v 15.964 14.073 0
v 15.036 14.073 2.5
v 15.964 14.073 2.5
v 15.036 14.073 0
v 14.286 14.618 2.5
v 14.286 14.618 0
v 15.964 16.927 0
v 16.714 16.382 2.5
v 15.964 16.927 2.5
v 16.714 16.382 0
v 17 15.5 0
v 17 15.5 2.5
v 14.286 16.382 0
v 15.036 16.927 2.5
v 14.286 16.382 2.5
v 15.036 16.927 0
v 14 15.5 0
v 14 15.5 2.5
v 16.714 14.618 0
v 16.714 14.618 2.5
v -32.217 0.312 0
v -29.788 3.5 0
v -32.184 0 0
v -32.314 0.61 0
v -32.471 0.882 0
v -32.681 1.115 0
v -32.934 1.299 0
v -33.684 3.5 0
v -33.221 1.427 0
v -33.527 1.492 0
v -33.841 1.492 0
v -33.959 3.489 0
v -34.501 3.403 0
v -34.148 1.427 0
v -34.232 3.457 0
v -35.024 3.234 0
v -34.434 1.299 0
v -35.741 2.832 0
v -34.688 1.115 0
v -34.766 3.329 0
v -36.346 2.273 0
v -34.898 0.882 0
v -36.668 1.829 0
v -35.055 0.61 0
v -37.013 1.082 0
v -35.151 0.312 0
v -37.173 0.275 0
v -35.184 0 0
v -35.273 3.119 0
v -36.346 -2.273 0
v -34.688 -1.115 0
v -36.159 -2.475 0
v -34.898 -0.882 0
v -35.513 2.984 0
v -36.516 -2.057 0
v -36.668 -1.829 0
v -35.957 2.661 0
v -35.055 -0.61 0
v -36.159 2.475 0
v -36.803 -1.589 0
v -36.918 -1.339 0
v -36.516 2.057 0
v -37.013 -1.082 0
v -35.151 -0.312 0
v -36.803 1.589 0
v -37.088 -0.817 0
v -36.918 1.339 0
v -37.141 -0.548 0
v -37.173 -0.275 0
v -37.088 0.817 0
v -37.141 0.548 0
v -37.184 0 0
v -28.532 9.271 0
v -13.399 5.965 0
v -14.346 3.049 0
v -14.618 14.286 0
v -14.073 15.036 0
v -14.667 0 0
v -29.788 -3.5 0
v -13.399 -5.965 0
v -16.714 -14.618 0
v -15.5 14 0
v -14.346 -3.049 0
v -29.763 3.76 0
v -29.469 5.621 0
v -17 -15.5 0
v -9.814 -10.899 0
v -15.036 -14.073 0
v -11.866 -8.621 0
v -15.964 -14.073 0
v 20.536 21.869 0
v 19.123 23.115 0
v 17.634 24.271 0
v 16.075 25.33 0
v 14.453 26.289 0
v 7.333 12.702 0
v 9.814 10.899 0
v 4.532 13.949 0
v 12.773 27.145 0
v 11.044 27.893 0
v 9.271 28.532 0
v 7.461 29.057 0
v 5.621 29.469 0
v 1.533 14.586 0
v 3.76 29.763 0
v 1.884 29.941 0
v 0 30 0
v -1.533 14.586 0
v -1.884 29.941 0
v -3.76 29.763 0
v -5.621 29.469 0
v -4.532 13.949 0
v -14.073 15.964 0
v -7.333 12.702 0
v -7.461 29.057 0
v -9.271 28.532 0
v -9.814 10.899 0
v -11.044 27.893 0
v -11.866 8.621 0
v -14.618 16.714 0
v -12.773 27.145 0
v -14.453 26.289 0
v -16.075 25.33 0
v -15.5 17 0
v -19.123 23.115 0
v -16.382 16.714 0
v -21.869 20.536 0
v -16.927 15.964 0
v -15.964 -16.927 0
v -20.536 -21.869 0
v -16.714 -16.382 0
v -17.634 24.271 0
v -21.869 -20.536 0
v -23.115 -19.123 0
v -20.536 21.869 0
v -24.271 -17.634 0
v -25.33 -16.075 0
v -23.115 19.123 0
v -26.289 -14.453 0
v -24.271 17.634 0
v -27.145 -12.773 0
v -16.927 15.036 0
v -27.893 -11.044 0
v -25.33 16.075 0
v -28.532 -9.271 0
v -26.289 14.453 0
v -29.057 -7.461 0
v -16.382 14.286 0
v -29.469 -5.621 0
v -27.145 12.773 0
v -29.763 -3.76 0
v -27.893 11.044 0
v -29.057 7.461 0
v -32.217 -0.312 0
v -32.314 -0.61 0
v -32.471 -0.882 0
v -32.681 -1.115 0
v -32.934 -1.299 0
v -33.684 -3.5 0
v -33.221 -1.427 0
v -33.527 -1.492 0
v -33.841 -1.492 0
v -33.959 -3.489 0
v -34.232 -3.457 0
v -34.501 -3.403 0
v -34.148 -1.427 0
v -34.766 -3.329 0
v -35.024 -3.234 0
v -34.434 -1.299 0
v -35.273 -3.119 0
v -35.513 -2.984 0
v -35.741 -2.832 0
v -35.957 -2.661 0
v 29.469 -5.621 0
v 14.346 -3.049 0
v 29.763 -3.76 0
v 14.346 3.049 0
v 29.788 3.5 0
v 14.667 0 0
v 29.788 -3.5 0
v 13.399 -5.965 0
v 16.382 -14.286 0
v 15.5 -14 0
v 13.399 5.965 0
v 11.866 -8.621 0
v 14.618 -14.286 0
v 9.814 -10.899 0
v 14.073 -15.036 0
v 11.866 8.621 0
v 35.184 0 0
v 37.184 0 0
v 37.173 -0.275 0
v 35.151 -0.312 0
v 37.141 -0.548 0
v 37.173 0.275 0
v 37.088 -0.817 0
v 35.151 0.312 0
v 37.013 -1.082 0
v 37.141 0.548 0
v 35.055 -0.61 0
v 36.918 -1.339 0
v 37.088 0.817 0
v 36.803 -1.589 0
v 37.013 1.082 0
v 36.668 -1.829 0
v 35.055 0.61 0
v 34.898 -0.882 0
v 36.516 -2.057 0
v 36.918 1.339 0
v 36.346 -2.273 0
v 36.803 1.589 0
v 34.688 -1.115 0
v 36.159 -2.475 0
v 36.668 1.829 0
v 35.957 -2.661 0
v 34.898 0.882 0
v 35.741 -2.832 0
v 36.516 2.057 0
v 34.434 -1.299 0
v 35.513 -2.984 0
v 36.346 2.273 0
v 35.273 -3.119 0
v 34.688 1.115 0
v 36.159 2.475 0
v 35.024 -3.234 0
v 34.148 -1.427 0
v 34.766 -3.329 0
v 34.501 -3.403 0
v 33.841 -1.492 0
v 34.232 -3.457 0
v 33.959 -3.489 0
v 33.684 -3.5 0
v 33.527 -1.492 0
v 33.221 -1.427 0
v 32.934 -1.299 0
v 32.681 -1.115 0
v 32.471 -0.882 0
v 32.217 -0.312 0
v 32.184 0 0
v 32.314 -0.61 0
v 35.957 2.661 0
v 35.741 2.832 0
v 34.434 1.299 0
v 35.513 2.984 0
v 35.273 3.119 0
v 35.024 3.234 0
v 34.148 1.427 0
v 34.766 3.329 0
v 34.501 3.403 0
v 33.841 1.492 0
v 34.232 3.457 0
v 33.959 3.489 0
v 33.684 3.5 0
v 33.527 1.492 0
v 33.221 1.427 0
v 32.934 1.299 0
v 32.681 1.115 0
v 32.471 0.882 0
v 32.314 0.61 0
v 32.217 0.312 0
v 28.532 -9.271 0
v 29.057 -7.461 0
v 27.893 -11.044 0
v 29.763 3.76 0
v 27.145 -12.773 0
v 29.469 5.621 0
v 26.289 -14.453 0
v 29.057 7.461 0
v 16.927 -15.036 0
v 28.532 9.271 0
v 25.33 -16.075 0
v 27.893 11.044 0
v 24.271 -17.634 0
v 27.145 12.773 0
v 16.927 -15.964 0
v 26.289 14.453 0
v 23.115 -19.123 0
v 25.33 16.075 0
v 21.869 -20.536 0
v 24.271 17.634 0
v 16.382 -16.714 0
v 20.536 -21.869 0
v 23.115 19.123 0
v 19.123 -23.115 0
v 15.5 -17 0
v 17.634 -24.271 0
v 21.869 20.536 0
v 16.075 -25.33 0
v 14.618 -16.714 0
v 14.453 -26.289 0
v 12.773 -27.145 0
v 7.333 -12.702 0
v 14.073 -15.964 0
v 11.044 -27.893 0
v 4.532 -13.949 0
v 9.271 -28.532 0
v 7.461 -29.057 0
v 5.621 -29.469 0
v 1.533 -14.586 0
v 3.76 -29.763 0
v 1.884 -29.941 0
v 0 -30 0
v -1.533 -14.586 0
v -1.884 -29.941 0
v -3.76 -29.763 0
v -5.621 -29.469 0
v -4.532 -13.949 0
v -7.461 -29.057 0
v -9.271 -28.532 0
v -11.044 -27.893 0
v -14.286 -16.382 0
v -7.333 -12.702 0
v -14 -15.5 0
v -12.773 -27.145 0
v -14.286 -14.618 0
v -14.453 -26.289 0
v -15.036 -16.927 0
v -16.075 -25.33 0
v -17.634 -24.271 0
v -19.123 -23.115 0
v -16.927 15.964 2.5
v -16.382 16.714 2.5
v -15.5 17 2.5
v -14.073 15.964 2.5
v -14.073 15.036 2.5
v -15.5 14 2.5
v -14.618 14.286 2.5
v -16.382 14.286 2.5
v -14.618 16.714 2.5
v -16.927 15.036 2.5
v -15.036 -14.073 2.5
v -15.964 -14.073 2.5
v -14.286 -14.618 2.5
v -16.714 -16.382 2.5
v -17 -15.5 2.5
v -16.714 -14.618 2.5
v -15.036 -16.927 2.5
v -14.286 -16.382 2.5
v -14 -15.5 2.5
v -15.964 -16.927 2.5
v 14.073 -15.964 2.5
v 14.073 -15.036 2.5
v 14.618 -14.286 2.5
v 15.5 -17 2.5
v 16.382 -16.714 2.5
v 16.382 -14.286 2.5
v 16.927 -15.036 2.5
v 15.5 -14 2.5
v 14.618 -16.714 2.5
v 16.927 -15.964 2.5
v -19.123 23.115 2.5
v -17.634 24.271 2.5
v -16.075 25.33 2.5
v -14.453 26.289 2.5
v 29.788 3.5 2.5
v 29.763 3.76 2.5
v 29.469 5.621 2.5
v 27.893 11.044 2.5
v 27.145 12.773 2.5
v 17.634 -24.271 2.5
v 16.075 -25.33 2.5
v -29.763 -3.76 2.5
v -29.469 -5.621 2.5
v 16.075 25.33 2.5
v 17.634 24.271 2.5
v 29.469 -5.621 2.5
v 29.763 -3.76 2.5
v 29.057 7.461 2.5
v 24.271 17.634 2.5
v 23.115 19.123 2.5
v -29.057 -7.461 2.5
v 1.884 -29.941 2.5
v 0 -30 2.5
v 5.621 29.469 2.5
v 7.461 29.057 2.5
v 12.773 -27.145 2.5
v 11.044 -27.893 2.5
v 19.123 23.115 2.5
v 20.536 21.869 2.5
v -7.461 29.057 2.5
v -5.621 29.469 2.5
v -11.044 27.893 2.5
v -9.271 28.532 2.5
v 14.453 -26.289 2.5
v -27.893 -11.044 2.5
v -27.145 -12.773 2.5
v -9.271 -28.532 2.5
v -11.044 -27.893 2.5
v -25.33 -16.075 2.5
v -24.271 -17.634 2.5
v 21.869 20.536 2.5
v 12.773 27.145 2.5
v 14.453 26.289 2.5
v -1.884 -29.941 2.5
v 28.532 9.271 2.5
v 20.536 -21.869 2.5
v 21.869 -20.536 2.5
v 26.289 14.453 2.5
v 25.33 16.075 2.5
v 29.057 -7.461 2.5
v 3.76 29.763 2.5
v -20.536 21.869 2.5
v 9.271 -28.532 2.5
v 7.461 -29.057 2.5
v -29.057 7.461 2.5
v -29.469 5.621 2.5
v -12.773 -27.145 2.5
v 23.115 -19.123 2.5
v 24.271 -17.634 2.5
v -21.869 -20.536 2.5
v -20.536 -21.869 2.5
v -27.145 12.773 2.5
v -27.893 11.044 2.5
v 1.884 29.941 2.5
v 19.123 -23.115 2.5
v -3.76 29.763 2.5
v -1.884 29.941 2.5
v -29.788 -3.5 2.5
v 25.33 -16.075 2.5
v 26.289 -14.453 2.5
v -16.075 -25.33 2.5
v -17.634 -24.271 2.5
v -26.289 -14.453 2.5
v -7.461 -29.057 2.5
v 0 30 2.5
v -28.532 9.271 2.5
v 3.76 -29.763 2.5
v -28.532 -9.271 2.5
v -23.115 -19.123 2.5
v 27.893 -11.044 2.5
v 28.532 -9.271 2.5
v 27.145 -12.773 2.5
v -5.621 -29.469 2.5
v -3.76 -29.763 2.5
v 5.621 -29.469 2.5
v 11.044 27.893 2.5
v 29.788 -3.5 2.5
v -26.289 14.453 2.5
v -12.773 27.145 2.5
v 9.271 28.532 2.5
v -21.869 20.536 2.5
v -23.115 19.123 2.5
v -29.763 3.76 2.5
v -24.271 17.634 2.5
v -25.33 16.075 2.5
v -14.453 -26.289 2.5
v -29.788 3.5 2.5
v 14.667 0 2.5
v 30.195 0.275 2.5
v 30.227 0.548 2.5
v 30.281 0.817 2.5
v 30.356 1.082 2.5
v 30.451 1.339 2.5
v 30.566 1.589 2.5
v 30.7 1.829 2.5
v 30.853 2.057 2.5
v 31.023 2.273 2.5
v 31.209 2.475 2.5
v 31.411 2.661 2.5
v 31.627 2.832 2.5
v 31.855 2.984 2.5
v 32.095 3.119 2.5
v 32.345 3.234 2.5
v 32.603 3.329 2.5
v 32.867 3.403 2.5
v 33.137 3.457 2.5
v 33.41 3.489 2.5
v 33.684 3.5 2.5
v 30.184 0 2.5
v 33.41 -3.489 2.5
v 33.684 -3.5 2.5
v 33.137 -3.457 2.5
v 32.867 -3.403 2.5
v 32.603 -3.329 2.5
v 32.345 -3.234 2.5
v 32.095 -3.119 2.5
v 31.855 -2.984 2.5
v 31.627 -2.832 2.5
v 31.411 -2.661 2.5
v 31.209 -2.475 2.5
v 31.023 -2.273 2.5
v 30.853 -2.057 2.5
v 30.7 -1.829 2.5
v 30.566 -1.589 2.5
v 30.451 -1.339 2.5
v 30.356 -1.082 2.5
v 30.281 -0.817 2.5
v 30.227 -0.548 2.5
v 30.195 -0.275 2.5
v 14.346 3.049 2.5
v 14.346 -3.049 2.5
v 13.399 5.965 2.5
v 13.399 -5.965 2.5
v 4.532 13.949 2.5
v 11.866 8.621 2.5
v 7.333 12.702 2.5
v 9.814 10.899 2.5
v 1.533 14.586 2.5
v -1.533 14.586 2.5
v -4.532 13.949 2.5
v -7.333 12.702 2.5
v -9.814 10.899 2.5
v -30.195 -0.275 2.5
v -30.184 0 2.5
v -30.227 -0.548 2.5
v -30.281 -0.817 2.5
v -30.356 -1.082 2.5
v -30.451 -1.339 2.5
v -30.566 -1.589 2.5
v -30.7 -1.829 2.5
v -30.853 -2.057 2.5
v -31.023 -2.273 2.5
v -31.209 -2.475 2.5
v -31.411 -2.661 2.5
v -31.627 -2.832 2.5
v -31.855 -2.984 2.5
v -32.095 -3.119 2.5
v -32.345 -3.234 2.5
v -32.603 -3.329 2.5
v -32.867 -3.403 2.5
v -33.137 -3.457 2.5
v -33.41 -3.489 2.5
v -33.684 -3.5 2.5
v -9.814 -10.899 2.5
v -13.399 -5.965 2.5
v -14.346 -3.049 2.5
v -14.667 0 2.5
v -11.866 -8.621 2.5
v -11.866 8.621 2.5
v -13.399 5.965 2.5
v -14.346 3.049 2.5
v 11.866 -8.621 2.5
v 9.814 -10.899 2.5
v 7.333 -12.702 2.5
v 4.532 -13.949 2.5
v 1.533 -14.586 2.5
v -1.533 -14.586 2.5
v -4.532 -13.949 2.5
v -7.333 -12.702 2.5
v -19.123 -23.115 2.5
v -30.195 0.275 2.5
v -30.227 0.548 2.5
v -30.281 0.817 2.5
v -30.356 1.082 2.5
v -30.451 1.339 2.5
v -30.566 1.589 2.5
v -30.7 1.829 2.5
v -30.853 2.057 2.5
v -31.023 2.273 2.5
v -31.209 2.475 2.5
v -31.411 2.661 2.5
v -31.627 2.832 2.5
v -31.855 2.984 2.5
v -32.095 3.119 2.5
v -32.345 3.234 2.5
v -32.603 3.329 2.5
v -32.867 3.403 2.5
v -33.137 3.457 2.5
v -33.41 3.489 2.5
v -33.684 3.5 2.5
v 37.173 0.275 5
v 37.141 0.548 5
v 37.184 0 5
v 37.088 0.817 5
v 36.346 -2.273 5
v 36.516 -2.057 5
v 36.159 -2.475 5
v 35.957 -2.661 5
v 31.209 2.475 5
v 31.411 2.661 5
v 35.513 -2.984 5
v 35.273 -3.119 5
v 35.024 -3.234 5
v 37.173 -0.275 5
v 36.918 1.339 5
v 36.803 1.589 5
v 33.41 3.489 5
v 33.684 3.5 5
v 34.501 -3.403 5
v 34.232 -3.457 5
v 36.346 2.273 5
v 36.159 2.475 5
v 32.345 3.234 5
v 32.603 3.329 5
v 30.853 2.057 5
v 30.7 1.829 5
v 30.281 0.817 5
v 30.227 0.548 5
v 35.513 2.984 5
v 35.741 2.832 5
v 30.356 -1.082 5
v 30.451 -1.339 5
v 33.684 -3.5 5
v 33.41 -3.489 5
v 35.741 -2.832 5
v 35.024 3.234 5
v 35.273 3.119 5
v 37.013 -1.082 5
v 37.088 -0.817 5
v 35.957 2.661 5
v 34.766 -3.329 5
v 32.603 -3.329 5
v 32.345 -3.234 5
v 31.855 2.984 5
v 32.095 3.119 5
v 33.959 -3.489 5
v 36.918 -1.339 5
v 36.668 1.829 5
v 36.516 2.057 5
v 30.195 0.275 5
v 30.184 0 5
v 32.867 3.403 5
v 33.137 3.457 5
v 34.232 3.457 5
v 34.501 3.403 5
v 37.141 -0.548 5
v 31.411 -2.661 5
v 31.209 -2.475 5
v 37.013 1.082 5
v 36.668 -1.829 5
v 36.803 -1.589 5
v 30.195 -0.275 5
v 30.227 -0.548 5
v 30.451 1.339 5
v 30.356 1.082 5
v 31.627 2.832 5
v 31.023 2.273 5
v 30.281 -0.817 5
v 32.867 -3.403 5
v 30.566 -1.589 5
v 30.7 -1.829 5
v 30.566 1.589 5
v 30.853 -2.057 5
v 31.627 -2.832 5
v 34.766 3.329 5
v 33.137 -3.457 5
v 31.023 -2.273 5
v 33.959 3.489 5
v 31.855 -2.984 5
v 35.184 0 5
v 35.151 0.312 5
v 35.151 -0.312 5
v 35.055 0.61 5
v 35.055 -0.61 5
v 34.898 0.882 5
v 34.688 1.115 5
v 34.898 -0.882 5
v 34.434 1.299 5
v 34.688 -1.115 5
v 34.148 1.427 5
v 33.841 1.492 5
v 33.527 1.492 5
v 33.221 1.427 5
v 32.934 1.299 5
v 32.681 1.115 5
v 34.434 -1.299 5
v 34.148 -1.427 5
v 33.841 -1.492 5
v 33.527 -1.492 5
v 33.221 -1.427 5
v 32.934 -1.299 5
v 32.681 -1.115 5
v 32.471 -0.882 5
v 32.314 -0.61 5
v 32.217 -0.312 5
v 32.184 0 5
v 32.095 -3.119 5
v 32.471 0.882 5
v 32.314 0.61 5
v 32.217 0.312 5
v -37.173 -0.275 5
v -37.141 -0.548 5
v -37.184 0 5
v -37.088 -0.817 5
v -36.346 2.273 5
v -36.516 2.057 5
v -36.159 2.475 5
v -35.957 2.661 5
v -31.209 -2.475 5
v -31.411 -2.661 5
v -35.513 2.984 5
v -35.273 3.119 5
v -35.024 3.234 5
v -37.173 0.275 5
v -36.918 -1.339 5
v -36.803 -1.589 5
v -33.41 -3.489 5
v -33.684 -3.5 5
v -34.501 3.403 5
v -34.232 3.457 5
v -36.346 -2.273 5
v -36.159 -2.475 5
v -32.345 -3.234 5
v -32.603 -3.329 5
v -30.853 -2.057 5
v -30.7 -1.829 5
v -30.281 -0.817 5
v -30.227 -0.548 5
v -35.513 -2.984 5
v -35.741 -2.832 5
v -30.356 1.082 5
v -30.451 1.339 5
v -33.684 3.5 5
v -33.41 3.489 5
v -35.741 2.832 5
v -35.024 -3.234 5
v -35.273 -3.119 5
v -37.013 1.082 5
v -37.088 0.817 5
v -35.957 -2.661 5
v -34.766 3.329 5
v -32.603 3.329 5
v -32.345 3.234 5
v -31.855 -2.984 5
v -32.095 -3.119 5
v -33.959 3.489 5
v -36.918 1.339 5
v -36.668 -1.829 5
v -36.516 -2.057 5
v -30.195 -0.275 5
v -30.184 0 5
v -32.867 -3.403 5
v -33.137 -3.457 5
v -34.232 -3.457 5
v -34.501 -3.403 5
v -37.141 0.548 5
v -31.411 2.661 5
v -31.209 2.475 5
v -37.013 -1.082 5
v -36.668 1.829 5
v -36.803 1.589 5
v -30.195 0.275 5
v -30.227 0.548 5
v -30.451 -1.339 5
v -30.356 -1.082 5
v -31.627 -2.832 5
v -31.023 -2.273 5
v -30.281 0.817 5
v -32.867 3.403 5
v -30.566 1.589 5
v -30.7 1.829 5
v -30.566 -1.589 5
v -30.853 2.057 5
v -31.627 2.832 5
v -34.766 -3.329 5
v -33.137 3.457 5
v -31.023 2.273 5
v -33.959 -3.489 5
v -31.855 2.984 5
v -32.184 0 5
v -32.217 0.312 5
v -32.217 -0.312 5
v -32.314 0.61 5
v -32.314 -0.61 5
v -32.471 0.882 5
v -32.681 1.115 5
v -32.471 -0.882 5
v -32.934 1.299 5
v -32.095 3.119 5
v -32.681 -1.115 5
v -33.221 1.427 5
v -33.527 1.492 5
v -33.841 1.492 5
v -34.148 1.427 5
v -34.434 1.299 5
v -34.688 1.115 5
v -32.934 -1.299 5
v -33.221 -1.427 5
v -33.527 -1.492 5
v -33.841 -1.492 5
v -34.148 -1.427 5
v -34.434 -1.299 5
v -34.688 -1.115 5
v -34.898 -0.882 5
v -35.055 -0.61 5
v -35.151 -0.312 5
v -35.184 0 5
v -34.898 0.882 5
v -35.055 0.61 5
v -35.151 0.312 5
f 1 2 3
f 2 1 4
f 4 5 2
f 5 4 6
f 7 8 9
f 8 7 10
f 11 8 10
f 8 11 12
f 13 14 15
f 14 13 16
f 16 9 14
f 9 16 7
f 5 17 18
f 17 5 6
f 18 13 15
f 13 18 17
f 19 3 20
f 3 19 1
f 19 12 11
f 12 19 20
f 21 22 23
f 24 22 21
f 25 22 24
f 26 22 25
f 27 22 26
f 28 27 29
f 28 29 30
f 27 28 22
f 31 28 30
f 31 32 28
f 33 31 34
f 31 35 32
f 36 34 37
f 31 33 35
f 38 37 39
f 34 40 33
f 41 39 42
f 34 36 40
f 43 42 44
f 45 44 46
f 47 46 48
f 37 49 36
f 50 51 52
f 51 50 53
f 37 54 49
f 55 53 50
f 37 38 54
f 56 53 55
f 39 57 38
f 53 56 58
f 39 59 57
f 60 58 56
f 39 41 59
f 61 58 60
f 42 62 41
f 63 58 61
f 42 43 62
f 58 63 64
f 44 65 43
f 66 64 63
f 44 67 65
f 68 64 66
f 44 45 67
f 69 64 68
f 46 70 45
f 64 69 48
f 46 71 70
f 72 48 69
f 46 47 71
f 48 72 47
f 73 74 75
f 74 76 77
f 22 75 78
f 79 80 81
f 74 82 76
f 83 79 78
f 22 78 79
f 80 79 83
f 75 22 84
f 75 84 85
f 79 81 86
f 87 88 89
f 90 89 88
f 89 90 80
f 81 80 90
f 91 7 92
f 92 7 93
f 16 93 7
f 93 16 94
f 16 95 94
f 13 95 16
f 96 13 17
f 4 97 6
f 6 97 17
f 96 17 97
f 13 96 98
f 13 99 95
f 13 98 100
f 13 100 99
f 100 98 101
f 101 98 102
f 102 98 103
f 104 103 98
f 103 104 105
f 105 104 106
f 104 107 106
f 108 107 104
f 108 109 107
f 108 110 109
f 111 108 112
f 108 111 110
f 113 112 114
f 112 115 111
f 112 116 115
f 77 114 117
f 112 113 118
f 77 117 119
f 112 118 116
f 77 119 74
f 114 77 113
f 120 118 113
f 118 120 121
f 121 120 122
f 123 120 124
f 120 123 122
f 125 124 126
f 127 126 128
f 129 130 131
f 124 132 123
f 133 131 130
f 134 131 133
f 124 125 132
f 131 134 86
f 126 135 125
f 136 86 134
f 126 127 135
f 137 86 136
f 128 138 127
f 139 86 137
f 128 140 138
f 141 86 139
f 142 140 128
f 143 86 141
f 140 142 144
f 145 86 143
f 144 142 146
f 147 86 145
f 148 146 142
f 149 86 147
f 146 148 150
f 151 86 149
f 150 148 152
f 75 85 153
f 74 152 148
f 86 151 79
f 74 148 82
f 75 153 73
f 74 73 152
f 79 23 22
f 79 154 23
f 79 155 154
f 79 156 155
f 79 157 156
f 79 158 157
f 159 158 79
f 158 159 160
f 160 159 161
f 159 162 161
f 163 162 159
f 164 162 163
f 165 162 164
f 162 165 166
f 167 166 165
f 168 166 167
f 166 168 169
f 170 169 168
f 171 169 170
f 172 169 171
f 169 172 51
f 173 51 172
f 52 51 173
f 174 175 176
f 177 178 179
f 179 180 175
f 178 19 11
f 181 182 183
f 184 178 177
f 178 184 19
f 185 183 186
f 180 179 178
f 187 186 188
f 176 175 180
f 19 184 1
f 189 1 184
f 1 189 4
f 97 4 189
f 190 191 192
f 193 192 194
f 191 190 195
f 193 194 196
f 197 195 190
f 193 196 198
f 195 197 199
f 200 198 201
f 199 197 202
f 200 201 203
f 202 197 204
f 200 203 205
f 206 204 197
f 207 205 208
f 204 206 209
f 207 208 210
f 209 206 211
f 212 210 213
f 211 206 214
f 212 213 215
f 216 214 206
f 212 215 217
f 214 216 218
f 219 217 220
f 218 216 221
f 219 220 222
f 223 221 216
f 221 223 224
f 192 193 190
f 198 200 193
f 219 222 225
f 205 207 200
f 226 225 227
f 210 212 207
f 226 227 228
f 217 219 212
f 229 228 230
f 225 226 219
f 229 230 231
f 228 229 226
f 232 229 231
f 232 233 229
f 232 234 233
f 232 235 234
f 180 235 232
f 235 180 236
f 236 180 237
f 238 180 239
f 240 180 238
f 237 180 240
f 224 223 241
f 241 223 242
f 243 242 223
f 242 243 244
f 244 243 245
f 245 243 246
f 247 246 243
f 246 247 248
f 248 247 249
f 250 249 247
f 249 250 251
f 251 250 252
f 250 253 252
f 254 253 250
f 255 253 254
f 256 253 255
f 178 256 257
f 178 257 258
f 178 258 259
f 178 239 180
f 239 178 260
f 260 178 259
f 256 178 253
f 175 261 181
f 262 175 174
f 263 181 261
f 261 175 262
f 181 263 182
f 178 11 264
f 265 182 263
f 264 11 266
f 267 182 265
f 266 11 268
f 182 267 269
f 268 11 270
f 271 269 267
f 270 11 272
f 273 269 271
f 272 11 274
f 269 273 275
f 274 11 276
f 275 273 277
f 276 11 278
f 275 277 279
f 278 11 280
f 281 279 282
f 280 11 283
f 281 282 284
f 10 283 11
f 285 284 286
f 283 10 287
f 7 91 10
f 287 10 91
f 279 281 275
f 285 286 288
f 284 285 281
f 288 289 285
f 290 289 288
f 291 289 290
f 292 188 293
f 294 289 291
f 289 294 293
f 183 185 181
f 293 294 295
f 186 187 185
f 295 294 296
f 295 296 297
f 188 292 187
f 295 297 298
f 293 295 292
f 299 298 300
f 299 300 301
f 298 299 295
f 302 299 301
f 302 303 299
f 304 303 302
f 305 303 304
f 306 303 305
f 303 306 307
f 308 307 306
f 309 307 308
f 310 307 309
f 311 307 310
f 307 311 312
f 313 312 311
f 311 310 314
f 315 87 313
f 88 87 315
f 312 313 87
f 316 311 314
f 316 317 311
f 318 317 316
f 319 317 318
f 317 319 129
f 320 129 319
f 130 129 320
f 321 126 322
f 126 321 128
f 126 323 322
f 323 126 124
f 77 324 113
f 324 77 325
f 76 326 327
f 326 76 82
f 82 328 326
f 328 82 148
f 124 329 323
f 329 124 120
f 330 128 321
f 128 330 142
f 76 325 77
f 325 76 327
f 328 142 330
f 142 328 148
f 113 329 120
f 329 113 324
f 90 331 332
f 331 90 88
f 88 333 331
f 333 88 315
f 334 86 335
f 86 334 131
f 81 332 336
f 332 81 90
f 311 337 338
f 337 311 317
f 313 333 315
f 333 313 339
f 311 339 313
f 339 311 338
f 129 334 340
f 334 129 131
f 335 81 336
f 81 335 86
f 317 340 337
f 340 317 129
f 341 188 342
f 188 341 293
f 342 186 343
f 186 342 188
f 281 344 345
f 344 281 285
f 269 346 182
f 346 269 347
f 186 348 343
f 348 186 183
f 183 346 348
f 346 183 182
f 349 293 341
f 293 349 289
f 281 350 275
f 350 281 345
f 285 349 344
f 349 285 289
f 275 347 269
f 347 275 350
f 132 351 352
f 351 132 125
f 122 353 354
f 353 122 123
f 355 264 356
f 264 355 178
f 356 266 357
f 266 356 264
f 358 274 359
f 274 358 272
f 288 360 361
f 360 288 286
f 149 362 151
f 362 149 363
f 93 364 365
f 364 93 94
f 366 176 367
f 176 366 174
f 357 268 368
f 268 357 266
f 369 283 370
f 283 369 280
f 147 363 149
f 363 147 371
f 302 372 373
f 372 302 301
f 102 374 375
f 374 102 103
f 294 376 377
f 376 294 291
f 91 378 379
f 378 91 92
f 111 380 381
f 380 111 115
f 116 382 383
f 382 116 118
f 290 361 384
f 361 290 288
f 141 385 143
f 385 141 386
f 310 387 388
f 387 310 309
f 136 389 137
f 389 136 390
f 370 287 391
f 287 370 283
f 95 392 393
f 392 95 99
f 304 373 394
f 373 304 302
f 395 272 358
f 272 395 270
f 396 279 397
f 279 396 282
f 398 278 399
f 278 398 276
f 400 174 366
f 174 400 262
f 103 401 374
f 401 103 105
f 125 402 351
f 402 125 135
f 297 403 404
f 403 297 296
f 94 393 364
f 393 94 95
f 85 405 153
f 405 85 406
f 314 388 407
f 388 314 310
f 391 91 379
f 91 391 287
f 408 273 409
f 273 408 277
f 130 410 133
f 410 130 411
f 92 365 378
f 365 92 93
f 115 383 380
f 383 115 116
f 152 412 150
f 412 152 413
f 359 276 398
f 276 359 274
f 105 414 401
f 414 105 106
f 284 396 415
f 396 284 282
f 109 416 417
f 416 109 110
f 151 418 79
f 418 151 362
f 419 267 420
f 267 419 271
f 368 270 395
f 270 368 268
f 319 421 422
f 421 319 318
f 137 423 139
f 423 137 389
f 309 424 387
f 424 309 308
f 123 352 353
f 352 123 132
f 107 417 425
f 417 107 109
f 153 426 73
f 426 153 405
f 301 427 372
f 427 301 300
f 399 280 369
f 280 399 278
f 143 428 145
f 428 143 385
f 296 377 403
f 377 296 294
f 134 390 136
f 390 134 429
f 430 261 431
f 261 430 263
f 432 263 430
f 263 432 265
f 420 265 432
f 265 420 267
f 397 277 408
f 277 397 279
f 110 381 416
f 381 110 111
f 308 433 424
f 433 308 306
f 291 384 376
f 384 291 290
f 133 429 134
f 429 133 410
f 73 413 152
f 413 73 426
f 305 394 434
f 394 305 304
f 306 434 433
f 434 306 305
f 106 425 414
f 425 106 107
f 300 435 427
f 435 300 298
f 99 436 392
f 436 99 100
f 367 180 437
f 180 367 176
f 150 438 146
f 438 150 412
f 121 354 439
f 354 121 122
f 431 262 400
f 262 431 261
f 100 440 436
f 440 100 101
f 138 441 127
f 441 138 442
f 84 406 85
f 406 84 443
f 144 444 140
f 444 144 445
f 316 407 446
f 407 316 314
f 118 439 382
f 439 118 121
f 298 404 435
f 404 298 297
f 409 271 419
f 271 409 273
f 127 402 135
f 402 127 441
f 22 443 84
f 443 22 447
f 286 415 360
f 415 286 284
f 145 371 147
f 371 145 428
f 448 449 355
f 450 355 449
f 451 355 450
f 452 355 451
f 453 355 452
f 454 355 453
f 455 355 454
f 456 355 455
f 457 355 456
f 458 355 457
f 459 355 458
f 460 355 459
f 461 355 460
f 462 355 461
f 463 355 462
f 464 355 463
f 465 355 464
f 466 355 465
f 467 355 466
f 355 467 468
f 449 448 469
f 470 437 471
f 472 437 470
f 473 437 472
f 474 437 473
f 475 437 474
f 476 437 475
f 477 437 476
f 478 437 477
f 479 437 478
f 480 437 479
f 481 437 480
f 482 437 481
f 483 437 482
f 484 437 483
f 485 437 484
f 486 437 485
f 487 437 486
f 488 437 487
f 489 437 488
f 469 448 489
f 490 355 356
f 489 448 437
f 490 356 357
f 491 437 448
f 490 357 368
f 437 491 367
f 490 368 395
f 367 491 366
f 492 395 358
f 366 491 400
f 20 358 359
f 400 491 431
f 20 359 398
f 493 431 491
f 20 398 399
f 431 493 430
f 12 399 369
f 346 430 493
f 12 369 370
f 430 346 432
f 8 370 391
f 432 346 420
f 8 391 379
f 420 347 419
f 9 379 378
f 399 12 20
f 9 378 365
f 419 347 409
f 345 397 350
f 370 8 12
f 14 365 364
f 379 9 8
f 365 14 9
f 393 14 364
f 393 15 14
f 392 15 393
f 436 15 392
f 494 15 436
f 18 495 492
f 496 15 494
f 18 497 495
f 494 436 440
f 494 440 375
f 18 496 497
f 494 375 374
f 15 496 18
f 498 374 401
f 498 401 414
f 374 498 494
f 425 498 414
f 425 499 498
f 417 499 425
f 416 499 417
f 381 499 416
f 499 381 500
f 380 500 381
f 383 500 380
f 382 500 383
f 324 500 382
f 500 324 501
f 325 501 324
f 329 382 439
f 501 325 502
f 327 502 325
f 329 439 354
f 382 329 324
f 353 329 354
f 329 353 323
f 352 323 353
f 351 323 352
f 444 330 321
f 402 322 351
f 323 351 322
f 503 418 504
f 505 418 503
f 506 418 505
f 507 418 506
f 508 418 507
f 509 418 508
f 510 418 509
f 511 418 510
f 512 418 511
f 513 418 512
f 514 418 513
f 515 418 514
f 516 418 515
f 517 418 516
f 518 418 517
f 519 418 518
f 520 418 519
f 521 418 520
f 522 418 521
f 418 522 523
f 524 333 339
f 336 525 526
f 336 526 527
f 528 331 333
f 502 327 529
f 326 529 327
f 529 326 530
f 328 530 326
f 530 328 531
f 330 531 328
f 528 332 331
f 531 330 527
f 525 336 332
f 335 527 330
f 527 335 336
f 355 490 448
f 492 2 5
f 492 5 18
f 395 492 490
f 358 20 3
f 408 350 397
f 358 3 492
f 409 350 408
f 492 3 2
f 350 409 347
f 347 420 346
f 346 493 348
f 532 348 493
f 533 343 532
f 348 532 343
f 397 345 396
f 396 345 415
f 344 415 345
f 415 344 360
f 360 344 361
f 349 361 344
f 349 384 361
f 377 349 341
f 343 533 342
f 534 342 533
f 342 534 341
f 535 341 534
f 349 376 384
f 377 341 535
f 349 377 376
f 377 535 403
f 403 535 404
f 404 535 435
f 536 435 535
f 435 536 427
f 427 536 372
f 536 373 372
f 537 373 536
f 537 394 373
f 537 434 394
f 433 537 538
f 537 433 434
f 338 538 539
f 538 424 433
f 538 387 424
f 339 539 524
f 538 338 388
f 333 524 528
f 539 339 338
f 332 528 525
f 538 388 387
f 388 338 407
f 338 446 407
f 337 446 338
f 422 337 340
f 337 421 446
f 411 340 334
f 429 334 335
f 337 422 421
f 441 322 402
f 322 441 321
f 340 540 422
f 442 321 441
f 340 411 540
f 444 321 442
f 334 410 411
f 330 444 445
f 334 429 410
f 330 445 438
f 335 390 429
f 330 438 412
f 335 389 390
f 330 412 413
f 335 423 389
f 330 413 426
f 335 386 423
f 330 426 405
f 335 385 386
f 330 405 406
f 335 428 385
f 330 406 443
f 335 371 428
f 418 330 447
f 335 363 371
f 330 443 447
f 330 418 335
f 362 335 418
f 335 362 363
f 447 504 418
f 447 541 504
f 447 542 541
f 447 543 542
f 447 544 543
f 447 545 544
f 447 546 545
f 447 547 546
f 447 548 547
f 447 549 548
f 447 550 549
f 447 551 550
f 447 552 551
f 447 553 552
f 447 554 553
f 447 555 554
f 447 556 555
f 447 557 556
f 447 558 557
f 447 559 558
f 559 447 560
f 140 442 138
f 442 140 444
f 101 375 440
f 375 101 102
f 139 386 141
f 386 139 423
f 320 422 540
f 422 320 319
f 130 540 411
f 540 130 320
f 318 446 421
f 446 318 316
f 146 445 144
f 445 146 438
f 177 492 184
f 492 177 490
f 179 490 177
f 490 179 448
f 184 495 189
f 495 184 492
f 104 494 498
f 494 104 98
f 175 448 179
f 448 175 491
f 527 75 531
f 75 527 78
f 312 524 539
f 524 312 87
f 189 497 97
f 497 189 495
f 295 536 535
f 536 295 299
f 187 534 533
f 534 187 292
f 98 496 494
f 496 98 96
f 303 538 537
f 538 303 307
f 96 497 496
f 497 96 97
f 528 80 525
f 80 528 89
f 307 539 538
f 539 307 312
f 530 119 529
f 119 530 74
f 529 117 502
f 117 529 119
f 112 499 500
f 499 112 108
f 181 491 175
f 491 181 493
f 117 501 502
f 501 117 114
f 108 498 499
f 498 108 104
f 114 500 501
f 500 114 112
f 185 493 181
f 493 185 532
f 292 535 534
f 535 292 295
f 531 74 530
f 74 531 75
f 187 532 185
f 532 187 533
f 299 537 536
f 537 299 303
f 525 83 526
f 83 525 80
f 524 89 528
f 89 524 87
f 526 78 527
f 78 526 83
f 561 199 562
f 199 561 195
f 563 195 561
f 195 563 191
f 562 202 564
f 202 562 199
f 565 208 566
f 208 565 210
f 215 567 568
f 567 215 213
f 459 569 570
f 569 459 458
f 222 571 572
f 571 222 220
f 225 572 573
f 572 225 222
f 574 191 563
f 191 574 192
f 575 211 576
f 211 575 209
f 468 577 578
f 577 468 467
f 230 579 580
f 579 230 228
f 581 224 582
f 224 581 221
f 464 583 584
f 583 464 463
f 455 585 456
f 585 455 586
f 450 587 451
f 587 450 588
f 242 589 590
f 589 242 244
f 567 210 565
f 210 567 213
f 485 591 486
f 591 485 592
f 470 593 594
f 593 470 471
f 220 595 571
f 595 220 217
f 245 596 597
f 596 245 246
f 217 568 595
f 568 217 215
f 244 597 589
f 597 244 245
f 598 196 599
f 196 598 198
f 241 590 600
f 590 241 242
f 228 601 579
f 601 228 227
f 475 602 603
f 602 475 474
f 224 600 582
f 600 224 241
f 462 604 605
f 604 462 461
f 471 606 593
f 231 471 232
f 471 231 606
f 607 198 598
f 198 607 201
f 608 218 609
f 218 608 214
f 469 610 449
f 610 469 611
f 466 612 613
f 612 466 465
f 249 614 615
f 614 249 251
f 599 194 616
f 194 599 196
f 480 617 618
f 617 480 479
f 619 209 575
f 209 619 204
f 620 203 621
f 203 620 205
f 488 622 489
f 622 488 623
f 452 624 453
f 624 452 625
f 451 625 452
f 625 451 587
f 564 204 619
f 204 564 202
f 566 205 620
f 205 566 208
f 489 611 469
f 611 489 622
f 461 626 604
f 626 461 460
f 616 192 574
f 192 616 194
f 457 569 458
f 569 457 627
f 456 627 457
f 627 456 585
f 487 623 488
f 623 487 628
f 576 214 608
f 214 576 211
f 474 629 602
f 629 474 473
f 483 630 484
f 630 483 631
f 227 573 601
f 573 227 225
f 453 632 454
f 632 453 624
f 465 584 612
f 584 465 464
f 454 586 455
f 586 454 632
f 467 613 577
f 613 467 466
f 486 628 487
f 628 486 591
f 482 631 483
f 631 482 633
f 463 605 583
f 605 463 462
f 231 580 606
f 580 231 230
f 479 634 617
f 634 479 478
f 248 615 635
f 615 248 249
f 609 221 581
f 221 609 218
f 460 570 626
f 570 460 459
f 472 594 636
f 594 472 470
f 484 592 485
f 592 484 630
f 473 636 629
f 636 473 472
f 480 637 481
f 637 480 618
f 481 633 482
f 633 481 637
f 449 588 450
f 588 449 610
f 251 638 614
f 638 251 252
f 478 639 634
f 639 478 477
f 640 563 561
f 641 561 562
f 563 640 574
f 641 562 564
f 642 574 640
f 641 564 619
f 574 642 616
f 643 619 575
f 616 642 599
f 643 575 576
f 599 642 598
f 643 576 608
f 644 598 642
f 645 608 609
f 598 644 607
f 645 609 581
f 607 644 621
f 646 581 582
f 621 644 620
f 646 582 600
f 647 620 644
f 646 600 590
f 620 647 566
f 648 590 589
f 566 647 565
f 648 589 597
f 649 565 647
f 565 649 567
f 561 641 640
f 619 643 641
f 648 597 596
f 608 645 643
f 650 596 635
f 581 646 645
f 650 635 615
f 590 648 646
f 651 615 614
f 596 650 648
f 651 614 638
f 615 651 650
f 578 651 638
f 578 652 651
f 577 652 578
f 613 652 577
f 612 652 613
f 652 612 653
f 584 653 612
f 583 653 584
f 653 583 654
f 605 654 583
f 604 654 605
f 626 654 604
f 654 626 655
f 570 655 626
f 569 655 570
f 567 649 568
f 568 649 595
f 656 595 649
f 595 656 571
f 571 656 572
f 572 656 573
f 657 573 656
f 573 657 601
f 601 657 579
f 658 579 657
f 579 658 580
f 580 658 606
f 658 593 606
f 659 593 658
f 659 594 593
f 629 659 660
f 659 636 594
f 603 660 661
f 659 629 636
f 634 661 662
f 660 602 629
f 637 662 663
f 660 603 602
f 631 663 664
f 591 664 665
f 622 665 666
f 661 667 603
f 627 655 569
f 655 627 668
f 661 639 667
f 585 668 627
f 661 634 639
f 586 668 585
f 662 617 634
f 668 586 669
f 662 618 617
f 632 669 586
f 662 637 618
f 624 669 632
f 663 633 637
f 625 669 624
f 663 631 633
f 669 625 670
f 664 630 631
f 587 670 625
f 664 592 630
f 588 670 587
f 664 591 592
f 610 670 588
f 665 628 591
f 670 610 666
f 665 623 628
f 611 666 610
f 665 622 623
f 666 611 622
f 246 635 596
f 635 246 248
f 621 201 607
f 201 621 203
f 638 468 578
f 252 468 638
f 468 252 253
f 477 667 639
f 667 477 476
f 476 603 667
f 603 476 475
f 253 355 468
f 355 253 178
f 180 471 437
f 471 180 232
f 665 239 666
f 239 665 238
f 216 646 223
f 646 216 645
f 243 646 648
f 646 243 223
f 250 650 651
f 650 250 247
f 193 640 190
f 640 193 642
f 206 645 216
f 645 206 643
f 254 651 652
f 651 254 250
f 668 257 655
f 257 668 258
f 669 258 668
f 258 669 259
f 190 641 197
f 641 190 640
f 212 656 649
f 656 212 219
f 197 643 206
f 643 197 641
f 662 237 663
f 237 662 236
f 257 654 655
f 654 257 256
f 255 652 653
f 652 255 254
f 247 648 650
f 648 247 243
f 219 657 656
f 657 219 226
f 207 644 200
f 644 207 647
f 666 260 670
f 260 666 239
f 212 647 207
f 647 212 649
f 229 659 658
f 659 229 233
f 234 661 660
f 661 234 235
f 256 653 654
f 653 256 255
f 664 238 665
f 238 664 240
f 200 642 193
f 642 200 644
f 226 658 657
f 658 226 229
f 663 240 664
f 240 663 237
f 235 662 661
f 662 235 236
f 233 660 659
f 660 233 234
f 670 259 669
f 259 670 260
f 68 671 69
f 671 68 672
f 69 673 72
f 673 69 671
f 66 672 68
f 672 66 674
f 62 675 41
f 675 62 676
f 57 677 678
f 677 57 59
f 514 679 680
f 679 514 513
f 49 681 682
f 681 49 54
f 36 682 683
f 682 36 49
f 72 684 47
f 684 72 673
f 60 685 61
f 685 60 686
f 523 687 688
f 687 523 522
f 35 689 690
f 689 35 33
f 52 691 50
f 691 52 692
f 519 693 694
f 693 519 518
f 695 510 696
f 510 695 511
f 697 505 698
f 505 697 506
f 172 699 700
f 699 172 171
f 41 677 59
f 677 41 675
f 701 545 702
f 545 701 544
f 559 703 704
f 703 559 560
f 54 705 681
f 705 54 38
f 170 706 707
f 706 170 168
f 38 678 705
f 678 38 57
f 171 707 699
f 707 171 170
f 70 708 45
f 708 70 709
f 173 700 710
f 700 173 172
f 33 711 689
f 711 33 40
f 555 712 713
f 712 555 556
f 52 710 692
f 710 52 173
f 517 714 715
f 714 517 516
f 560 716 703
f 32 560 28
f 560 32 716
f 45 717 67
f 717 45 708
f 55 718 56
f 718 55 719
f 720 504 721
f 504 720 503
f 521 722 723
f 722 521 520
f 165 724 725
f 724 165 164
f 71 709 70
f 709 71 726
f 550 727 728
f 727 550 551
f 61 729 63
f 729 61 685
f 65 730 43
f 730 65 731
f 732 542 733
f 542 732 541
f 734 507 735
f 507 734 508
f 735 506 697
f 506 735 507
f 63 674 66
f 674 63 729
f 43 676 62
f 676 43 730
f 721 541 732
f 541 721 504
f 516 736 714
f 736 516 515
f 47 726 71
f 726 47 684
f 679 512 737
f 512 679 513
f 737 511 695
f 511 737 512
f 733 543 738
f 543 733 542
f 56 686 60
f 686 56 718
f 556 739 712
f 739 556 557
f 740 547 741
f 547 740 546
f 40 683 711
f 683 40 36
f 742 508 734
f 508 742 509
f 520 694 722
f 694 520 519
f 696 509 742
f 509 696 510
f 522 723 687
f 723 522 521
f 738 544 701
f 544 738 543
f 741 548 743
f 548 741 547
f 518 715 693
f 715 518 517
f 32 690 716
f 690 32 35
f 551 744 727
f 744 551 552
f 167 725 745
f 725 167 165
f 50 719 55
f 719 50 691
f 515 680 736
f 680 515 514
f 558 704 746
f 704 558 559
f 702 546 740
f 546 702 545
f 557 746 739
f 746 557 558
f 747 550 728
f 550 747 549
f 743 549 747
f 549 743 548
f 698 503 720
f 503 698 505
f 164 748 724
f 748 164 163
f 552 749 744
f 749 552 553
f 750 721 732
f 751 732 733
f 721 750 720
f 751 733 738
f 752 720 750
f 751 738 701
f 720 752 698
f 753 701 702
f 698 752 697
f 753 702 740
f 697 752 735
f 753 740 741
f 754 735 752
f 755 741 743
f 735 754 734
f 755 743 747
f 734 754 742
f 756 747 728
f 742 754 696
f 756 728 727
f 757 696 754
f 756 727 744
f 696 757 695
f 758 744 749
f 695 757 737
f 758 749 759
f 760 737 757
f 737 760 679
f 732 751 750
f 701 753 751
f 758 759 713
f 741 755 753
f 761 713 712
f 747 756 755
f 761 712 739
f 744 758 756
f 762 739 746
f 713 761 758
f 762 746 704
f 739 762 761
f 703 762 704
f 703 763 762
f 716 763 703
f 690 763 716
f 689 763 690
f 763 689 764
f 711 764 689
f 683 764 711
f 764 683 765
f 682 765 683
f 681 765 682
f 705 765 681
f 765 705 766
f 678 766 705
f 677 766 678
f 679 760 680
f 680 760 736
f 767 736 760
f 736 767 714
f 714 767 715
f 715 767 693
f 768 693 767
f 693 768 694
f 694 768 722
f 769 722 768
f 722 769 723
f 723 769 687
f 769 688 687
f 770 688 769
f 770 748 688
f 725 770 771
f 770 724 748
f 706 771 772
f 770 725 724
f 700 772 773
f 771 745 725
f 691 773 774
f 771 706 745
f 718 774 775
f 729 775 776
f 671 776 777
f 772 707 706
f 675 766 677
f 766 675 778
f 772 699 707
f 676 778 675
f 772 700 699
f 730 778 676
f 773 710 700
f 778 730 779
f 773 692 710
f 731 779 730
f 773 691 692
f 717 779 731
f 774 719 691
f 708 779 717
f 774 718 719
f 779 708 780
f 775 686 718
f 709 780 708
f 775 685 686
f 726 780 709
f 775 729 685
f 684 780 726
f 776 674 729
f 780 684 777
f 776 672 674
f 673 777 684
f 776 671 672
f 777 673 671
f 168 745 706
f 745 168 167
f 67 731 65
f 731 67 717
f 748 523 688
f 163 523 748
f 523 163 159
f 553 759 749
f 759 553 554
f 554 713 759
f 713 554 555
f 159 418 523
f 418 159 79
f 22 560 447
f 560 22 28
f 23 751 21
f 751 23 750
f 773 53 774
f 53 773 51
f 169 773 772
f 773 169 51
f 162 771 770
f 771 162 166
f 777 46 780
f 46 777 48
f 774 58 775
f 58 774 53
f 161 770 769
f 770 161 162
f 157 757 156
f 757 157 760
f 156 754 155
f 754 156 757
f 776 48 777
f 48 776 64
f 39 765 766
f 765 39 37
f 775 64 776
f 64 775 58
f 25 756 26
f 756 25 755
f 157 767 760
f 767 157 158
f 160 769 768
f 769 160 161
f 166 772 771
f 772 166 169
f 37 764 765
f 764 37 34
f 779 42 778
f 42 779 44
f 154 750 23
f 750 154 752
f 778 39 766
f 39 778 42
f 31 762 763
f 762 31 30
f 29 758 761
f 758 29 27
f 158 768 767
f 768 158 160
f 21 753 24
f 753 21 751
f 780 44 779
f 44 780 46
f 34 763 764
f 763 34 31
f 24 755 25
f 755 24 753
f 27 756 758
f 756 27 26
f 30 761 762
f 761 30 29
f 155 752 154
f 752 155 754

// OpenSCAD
// Nema Mounted Parametric Peristaltic Pump (customizable)
// by Ben Spearman 2024
//
//
// Modified version of:
// Planetary peristaltic pump (customizable)
// by Drmn4ea (drmn4ea at google's mail)
// https://www.thingiverse.com/thing:454702
//
// Adapted from Emmett Lalish's Planetary Gear Bearing at
// http://www.thingiverse.com/thing:53451
//
// Released under the Creative Commons - Attribution - Share Alike license
// (http://creativecommons.org/licenses/by-sa/3.0/)


// -------- Render and output options --------

// Output option. Options are: pump, plate, crank. Case sensitive.
output = "plate";

// --------  Printer-related settings ------------

// Clearance to generate between the gears within the pump. If the gears print 'stuck together' or are difficult to separate, try increasing this value. If there is excessive play between them, try lowering it. (default: 0.15mm)
gear_tolerance = 0.19;

// Allowed overhang for overhang removal, between 0 and 0.999 (0 = none, 0.5 = 45 degrees, 1 = infinite)
allowed_overhang = 0.75;


// --------  Details of the stepper motor used, in mm -------------

// width of motor shaft
shaft_size = 5.5;

// The spacing between the mounting holes on the stepper motor. Measure from the center of the holes.
bolt_spacing = 31;

// The space between the mounting plate and the pump gears.
mount_spacing = 2.5;

// How thick the mounting plate should be.
plate_thickness = 2.5;

// Mount inner diameter. The hole that will be in the center of the mounting plate.
mount_id = 22;

// The size of the mounting holes. Standard Nema 17 is an M3 (3mm).
thread_size = 3;

// -------------------- Connector settings ---------------------------------
// The thread size for the connector bolts you want, in mm (i.e. M3 is 3.0)
connect_bolt_size = 3.0;

// The lenght of the connector bolts, in mm (i.e M3x10 is 10.0)
connect_bolt_height = 10.0;

// Number of connectors you want.
num_connectors = 2;


// --------  Details of the tubing used in the pump, in mm ------------

// Outer diameter of your tubing in mm TO DO: make this separate from hole diam
tubing_od = 3;

// Extra mm to add to the exit holes for the tubing. Suggested is 0.3mm
tubing_exit_tolerance=0.3;

// Wall thickness of your tubing
tubing_wall_thickness = 1.6;

// Amount the tubing should be compressed by the rollers, as a proportion of total thickness (0 = no squish, 1.0 = complete squish)
tubing_squish_ratio = 0.4;


// --------  Part geometry settings ------------

// Diameter of the pump. Minimum of 60mm.
diam = 60;

// Thickness i.e. height in mm
thick = 15;

// Number of planet gears
number_of_planets = 3;

// Number of teeth on planet gears
number_of_teeth_on_planets = 7;

// Number of teeth on sun gear (approximate)
approximate_number_of_teeth_on_sun = 9;

// pressure angle
press_ang = 45;//[30:60]

// number of teeth to twist across
n_twist = 1;




// ----------------Calculated values -----------------
	// TODO: Rename variables to be more useful/legible.

dr = 0.5*1;// maximum depth ratio of teeth
m = round(number_of_planets);
num_p_teeth = round(number_of_teeth_on_planets);
ns1 = approximate_number_of_teeth_on_sun;
k1 = round(2 / m * (ns1 + num_p_teeth));
k =  k1 * m % 2 != 0 ? k1 + 1 : k1;
ns = k * m / 2 - num_p_teeth;
echo(ns=ns);
nr = ns + 2 * num_p_teeth;
pitchD = 0.9 * diam / (1 + min(PI / ( 2 * nr * tan(press_ang)), PI * dr / nr));
pitch = pitchD * PI / nr;
echo(pitch=pitch);
helix_angle = atan(2 * n_twist * pitch / thick);
echo(helix_angle=helix_angle);

phi = $t * 360 / m;

// compute some parameters related to the tubing
tubing_squished_width = tubing_od * (PI / 2);
tubing_depth_clearance = 2 * (tubing_wall_thickness * (1 - tubing_squish_ratio));

// actual pump diameter after adding tubing_depth_clearance
pump_rad = diam / 2;


// temporary variables for computing the outer radius of the outer ring gear teeth
// used to make the clearance for the peristaltic squeezer feature on the planets
outerring_pitch_radius = nr * pitch / (2 * PI);
outerring_depth = pitch / (2 * tan(press_ang));
outerring_outer_radius = gear_tolerance < 0 ? outerring_pitch_radius + outerring_depth / 2 - gear_tolerance : outerring_pitch_radius + outerring_depth / 2;

// temporary variables for computing the outer radius of the planet gear teeth
// used to make the peristaltic squeezer feature on the planets
planet_pitch_radius = num_p_teeth * pitch / (2 * PI);
planet_depth = pitch / (2 * tan(press_ang));
planet_outer_radius = gear_tolerance < 0 ? planet_pitch_radius + planet_depth / 2 - gear_tolerance : planet_pitch_radius + planet_depth / 2;

// temporary variables for computing the inside & outside radius of the sun gear teeth
// used to make clearance for planet squeezers
sun_pitch_radius = ns * pitch / (2 * PI);
sun_base_radius = sun_pitch_radius * cos(press_ang);
echo(sun_base_radius=sun_base_radius);
sun_depth = pitch / (2 * tan(press_ang));
sun_outer_radius = gear_tolerance < 0 ? sun_pitch_radius + sun_depth / 2 - gear_tolerance : sun_pitch_radius + sun_depth / 2;
sun_root_radius1 = sun_pitch_radius - sun_depth / 2 - gear_tolerance / 2;
sun_root_radius = (gear_tolerance < 0 && sun_root_radius1 < sun_base_radius) ? sun_base_radius : sun_root_radius1;
sun_min_radius = max (sun_base_radius, sun_root_radius);


min_connector_od = 7;
// Connectors have a minimum outer diameter to ensure printability.
connector_od = (connect_bolt_size + 2) < min_connector_od ? min_connector_od : connect_bolt_size + 2;
connector_dist_from_pump = connector_od/1.9;


// ========================= MAIN  ===============================================================================

/* Run with true to see mounting plate and pump stacked on top of each other
	for ease of designing.*/ 
if (output == "pump"){
	pump();
} else if (output == "plate"){
	mounting_plate();
} else if (output == "crank"){
	hand_crank();
}

//pump_and_mount(false);
//test_motor_shaft_mount();

// ==============================================================================================================
// +++++++++++++++++++++ MODULES +++++++++++++++++++++

/* The pump and mount, positioned either ready for printing, or stacked to
	help during design.
*/
module pump_and_mount(stacked=false){
	pump();
	if(stacked){
		// Floating underneath
		translate([0,  0,  -(plate_thickness+mount_spacing)]){
				mounting_plate();
		}
	} else {
		// To the side
		translate([(diam + (connector_od*3)),  0,  0]){
				mounting_plate();
		}
	}
}

/*
The whole pump, sitting at 0, 0, 0.
*/
module pump(){
	translate([0, 0, thick / 2]){
		outer_ring();
		sun_gear();
		planet_gears();
	}
}

/* 
Full mounting plate object to attach to both the pump and the motor.
Includes the mount_spacing amount of space between the pump and mount for
clearance.
*/
module mounting_plate(){
	union(){
		difference(){
			cylinder(h=plate_thickness, r=pump_rad, $fn=100);
			cylinder(h=plate_thickness + 1, r=(mount_id/3)*2);
			for(hole_num = [0 : 1 : 4]){
				rotate([0, 0, (hole_num * 90)]){
					translate([bolt_spacing/2, bolt_spacing/2, 0]){
						cylinder(h=plate_thickness+1, d=thread_size, $fn=10);
					}
				}
			}
		}
		all_connectors(true);
	}
}

module hand_crank(){
	union(){
		// the gear with band cut out of the middle
		difference(){
			cylinder(h=thick, r=15, center=true);
			// center hole
			motor_shaft();
		}
		translate([0, 0, 5]){
			gear(number_of_teeth=15, circular_pitch=10, pressure_angle=60, depth_ratio=0.5, clearance=0, helix_angle=0, gear_thickness=10, flat=false);
		}
	}
}

/* 
The outer ring of the pump. Has some hacky code done by previous devs,
and needs cleaning up.
*/
module outer_ring(){
	union(){
		difference(){
			cylinder(r=pump_rad, h=thick, center=true, $fn=100);
			exitholes(len=100);
				
			union(){
				// HACK: On my printer, it seems to need extra clearance for the outside gear, trying double...
				herringbone(nr,pitch, press_ang, dr, -2 * gear_tolerance, helix_angle, thick + 0.2);
				cylinder(r=outerring_outer_radius + tubing_depth_clearance, h=tubing_squished_width, center=true, $fn=100);
				// overhang removal for top teeth of outer ring: create a frustum starting at the top surface of the "roller" cylinder 
				// (which will actually be cut out of the outer ring) and shrinking inward at the allowed overhang angle until it reaches the
				// gear root diameter.
				translate([0, 0, tubing_squished_width / 2]){
					cylinder(r1=outerring_outer_radius + tubing_depth_clearance, r2=outerring_depth, h=abs(outerring_outer_radius + tubing_depth_clearance - outerring_depth) / tan(allowed_overhang * 90), center=false, $fn=100);
				}
			}
		}
		translate([0, 0, -(thick/2)]){
			all_connectors();
		}
	}
}

/*
The sun gear (middle gear) for the pump.
*/
module sun_gear(){
    rotate([0, 0, (num_p_teeth + 1) * 180 / ns + phi * (ns + num_p_teeth) * 2 / ns])
	
	difference(){
		// the gear with band cut out of the middle
		difference(){
			mirror([0, 1, 0]){
				herringbone(ns, pitch, press_ang, dr, gear_tolerance, helix_angle, thick);
			}
			// center hole
			motor_shaft();
			// gap for planet squeezer surface
			difference(){
				cylinder(r=sun_outer_radius, h=tubing_squished_width, center=true, $fn=100);
				cylinder(r=sun_min_radius - gear_tolerance, h=tubing_squished_width, center=true, $fn=100);
			}
		}
		// on the top part, cut an angle on the underside of the gear teeth to keep the overhang to a feasible amount
		translate([0, 0, tubing_squished_width / 2]){
			difference(){
				// in height, numeric constant sets the amount of allowed overhang after trim.
				//h=abs((sun_min_radius-gear_tolerance)-sun_outer_radius)*(1-allowed_overhang)
				// h=tan(allowed_overhang*90)
				cylinder(r=sun_outer_radius, h=abs((sun_min_radius - gear_tolerance) - sun_outer_radius) / tan(allowed_overhang * 90), center=false, $fn=100);
				cylinder(r1=sun_min_radius - gear_tolerance, r2=sun_outer_radius, h=abs((sun_min_radius - gear_tolerance) - sun_outer_radius) / tan(allowed_overhang * 90), center=false, $fn=100);
			}
		}
	}
}

/*
All planet gears (outer gears) based on number_of_planets.
*/
module planet_gears(){
    for(i=[1:m]){
		rotate([0, 0, i * 360 / m + phi]){
			translate([pitchD / 2 * (ns + num_p_teeth) / nr, 0, 0]){
				rotate([0, 0, i * ns / m * 360 / num_p_teeth - phi * (ns + num_p_teeth) / num_p_teeth - phi]){
					union(){
						herringbone(num_p_teeth, pitch, press_ang, dr, gear_tolerance, helix_angle, thick);
						// Add a roller cylinder in the center of the planet gears.
						// But also constrain overhangs to a sane level, so this is kind of a mess...
						intersection(){
							// the cylinder itself
							cylinder(r=planet_outer_radius, h=tubing_squished_width - gear_tolerance, center=true, $fn=100);

							// Now deal with overhang on the underside of the planets' roller cylinders.
							planet_overhangfix(pitch, press_ang, dr, gear_tolerance, helix_angle, thick, tubing_squished_width, allowed_overhang);
						}
					}
				}
			}
		}
	}
}

/*
Deals with the overhang on the underside of the planets' roller cylinders by doing the following:
 - Create the outline of a gear where the herringbone meets the cylinder;
 - Make its angle match the twist at this point.
 - Then difference this flat gear from a slightly larger cylinder, extrude it with an
	outward-growing angle, and cut the result from the cylinder.
*/
module planet_overhangfix(circular_pitch=10, 	pressure_angle=28, depth_ratio=1, clearance=0,
											 helix_angle=0, gear_thickness=5, tubing_squished_width, allowed_overhang){

	height_from_bottom =  (gear_thickness / 2) - (tubing_squished_width / 2);
	pitch_radius = num_p_teeth*circular_pitch / (2  *PI);
												 
	// The total rotation angle at that point - should match that of the gear itself
	twist=tan(helix_angle) * height_from_bottom / pitch_radius * 180 / PI; 

	// Relative to center height, where this is used
	translate([0,0, -tubing_squished_width/2]) {
		// FIXME: This calculation is most likely wrong...
		//rotate([0, 0, helix_angle * ((tubing_squished_width-(2*gear_tolerance))/2)])
		rotate([0, 0, twist]){
			// want to extrude to a height proportional to the distance between the root of the gear teeth
			// and the outer edge of the cylinder
			linear_extrude(height=tubing_squished_width - clearance, twist=0, slices=6, scale=1 + (1 / (1 - allowed_overhang))){
				gear2D(num_p_teeth, circular_pitch, pressure_angle, depth_ratio, clearance);
			}
		}
	}
}

/*
Makes the tubing exit holes through the outerring of the pump.
*/
module exitholes(){
	// HACK: Add tubing depth clearance value to the total OD, otherwise the outer part may be too thin.
	// FIXME: This is a quick n dirty way and makes the actual OD not match what the user entered...
	distance_apart = outerring_outer_radius;
	exit_hole_size = tubing_od+tubing_exit_tolerance;

	translate([distance_apart, len/2, 0]){
		rotate([90, 0, 0]){
			cylinder(d=exit_hole_size, h=len, center=true, $fn=100);
		}
	}
	mirror([1,0,0]){
		translate([distance_apart, len/2, 0]){
			rotate([90, 0, 0]){
				cylinder(d=tubing_od, h=len, center=true, $fn=100);
			}
		}
	}
}


module test_motor_shaft_mount(){
	difference(){
		cylinder(d=(shaft_size*2), h=thick, center=true);
		motor_shaft();
	}
}

/* An object the size of the stepper motors' motor shaft. Used for creating
	the mounting hole in the center of the pump. Is not influenced by gear_tolerance
	parameter.
*/
module motor_shaft(){
    difference(){
        cylinder(d=shaft_size, h=thick + 1,center=true, $fn=100);
        translate([0, (shaft_size/2), 0]){
			cube([(shaft_size), (thick/10), thick + (thick / 10)], center=true);
		}
    }
}


/*  Creates all num_connectors number of connectors for either the pump or plate.
	Needs to be called once for the pump, and once for the plate.
	
	Args:
		is_plate: Whether the connectors are attaching to the mounting plate or not.
*/
module all_connectors(is_plate=false){
	union(){
		increment = 360 / num_connectors;
		for(count = [0 : num_connectors]){
			rotate([0,  0, count*increment]){
				translate([pump_rad +connector_dist_from_pump,  0,  0]){
					connector(is_plate);
				}
			}
		}
	}
}


/*  Creates an individual connector. Changes it's height and attachment size 
	depending on if the connector is for the pump or mounting plate.
	
	Args:
		is_plate: Whether the connector is attaching to the mounting plate or not.
*/
module connector(is_plate=false){
	if (is_plate) {
		difference(){
			union(){
				cylinder(h=plate_thickness + mount_spacing, d=connector_od, $fn=80);
				translate([-connector_od/1.5,  -connector_od/2,  0]){
					cube([connector_od/1.5, connector_od, plate_thickness]);
				}
			}
			cylinder(h=plate_thickness + mount_spacing, d=connect_bolt_size, $fn=30);
		}
	} else {
		difference(){
			cylinder(h=connect_bolt_height - 2, d=connector_od, $fn=80);
			cylinder(h=connect_bolt_height - 2, d=connect_bolt_size, $fn=80);
		}
		difference(){
			union(){
				cylinder(h=connect_bolt_height - 2, d=connector_od, $fn=80);
				translate([-connector_od/1.5,  -connector_od/2,  0]){
					cube([connector_od/1.5, connector_od, connect_bolt_height - 2]);
				}
			}
			cylinder(h=connect_bolt_height - 2, d=connect_bolt_size, $fn=30);
		}
	}
}


module herringbone(number_of_teeth=15, circular_pitch=10, pressure_angle=28, depth_ratio=1,
								clearance=0, helix_angle=0, gear_thickness=5){
	union(){
		//translate([0,0,10])
		gear(number_of_teeth, circular_pitch, pressure_angle, depth_ratio, clearance, helix_angle, gear_thickness/2);
		mirror([0,0,1]){
			gear(number_of_teeth, circular_pitch, pressure_angle, depth_ratio, clearance, helix_angle, gear_thickness/2);
		}
	}
}

/*
Creates a single gear.
*/
module gear(number_of_teeth=15, circular_pitch=10, pressure_angle=28, depth_ratio=1,
						clearance=0, helix_angle=0, gear_thickness=5, flat=false){

	pitch_radius = number_of_teeth * circular_pitch / (2 * PI);
	twist=tan(helix_angle) * gear_thickness / pitch_radius * 180 / PI;

	flat_extrude(h=gear_thickness,twist=twist,flat=flat){
		gear2D (number_of_teeth, circular_pitch, pressure_angle, depth_ratio, clearance);
	}
}


module flat_extrude(h, twist, flat){
	if(flat==false)
		linear_extrude(height=h, twist=twist, slices=twist / 6, scale=1)children(0);
	else
		children(0);
}


module gear2D (number_of_teeth,	circular_pitch, pressure_angle, depth_ratio, clearance){
	pitch_radius = number_of_teeth*circular_pitch / (2  *PI);
	base_radius = pitch_radius * cos(pressure_angle);
	depth=circular_pitch / (2 * tan(pressure_angle));
	outer_radius = clearance < 0 ? pitch_radius + depth / 2 - clearance : pitch_radius + depth / 2;
	root_radius1 = pitch_radius - depth / 2 - clearance / 2;
	root_radius = (clearance < 0 && root_radius1 < base_radius) ? base_radius : root_radius1;
	backlash_angle = clearance / (pitch_radius * cos(pressure_angle)) * 180 / PI;
	half_thick_angle = 90 / number_of_teeth - backlash_angle / 2;
	pitch_point = involute (base_radius, involute_intersect_angle (base_radius, pitch_radius));
	pitch_angle = atan2 (pitch_point[1], pitch_point[0]);
	min_radius = max (base_radius, root_radius);

	intersection(){
		rotate(90 / number_of_teeth)
			circle($fn=number_of_teeth * 3, r=pitch_radius + (((depth_ratio * circular_pitch) / 2) - clearance) / 2);
		union(){
			rotate(90 / number_of_teeth)
				circle($fn=number_of_teeth * 2, r=max(root_radius, pitch_radius - depth_ratio * circular_pitch / 2 - clearance / 2));
			for (i = [1:number_of_teeth])rotate(i * 360 / number_of_teeth){
				halftooth (
					pitch_angle,
					base_radius,
					min_radius,
					outer_radius,
					half_thick_angle);		
				mirror([0,1])halftooth (
					pitch_angle,
					base_radius,
					min_radius,
					outer_radius,
					half_thick_angle);
			}
		}
	}
}


module halftooth (pitch_angle, base_radius, min_radius, outer_radius, half_thick_angle){
	index=[0,1,2,3,4,5];
	start_angle = max(involute_intersect_angle (base_radius, min_radius)-5,0);
	stop_angle = involute_intersect_angle (base_radius, outer_radius);
	angle = index * (stop_angle - start_angle) / index[len(index)-1];
	point_array=[
		[0,0],
		involute(base_radius, angle[0] + start_angle),
		involute(base_radius, angle[1] + start_angle),
		involute(base_radius, angle[2] + start_angle),
		involute(base_radius, angle[3] + start_angle),
		involute(base_radius, angle[4] + start_angle),
		involute(base_radius, angle[5] + start_angle)
	];

	difference(){
		rotate(-pitch_angle - half_thick_angle) polygon(points=point_array);
		square(2 * outer_radius);
	}
}

// Mathematical Functions
//===============

// Finds the angle of the involute about the base radius at the given distance (radius) from it's center.
//source: http://www.mathhelpforum.com/math-help/geometry/136011-circle-involute-solving-y-any-given-x.html

function involute_intersect_angle (base_radius, radius) = sqrt (pow (radius/base_radius, 2) - 1) * 180 / PI;

// Calculate the involute position for a given base radius and involute angle.

function involute (base_radius, involute_angle) =
[
	base_radius*(cos (involute_angle) + involute_angle*PI/180*sin (involute_angle)),
	base_radius*(sin (involute_angle) - involute_angle*PI/180*cos (involute_angle))
];
